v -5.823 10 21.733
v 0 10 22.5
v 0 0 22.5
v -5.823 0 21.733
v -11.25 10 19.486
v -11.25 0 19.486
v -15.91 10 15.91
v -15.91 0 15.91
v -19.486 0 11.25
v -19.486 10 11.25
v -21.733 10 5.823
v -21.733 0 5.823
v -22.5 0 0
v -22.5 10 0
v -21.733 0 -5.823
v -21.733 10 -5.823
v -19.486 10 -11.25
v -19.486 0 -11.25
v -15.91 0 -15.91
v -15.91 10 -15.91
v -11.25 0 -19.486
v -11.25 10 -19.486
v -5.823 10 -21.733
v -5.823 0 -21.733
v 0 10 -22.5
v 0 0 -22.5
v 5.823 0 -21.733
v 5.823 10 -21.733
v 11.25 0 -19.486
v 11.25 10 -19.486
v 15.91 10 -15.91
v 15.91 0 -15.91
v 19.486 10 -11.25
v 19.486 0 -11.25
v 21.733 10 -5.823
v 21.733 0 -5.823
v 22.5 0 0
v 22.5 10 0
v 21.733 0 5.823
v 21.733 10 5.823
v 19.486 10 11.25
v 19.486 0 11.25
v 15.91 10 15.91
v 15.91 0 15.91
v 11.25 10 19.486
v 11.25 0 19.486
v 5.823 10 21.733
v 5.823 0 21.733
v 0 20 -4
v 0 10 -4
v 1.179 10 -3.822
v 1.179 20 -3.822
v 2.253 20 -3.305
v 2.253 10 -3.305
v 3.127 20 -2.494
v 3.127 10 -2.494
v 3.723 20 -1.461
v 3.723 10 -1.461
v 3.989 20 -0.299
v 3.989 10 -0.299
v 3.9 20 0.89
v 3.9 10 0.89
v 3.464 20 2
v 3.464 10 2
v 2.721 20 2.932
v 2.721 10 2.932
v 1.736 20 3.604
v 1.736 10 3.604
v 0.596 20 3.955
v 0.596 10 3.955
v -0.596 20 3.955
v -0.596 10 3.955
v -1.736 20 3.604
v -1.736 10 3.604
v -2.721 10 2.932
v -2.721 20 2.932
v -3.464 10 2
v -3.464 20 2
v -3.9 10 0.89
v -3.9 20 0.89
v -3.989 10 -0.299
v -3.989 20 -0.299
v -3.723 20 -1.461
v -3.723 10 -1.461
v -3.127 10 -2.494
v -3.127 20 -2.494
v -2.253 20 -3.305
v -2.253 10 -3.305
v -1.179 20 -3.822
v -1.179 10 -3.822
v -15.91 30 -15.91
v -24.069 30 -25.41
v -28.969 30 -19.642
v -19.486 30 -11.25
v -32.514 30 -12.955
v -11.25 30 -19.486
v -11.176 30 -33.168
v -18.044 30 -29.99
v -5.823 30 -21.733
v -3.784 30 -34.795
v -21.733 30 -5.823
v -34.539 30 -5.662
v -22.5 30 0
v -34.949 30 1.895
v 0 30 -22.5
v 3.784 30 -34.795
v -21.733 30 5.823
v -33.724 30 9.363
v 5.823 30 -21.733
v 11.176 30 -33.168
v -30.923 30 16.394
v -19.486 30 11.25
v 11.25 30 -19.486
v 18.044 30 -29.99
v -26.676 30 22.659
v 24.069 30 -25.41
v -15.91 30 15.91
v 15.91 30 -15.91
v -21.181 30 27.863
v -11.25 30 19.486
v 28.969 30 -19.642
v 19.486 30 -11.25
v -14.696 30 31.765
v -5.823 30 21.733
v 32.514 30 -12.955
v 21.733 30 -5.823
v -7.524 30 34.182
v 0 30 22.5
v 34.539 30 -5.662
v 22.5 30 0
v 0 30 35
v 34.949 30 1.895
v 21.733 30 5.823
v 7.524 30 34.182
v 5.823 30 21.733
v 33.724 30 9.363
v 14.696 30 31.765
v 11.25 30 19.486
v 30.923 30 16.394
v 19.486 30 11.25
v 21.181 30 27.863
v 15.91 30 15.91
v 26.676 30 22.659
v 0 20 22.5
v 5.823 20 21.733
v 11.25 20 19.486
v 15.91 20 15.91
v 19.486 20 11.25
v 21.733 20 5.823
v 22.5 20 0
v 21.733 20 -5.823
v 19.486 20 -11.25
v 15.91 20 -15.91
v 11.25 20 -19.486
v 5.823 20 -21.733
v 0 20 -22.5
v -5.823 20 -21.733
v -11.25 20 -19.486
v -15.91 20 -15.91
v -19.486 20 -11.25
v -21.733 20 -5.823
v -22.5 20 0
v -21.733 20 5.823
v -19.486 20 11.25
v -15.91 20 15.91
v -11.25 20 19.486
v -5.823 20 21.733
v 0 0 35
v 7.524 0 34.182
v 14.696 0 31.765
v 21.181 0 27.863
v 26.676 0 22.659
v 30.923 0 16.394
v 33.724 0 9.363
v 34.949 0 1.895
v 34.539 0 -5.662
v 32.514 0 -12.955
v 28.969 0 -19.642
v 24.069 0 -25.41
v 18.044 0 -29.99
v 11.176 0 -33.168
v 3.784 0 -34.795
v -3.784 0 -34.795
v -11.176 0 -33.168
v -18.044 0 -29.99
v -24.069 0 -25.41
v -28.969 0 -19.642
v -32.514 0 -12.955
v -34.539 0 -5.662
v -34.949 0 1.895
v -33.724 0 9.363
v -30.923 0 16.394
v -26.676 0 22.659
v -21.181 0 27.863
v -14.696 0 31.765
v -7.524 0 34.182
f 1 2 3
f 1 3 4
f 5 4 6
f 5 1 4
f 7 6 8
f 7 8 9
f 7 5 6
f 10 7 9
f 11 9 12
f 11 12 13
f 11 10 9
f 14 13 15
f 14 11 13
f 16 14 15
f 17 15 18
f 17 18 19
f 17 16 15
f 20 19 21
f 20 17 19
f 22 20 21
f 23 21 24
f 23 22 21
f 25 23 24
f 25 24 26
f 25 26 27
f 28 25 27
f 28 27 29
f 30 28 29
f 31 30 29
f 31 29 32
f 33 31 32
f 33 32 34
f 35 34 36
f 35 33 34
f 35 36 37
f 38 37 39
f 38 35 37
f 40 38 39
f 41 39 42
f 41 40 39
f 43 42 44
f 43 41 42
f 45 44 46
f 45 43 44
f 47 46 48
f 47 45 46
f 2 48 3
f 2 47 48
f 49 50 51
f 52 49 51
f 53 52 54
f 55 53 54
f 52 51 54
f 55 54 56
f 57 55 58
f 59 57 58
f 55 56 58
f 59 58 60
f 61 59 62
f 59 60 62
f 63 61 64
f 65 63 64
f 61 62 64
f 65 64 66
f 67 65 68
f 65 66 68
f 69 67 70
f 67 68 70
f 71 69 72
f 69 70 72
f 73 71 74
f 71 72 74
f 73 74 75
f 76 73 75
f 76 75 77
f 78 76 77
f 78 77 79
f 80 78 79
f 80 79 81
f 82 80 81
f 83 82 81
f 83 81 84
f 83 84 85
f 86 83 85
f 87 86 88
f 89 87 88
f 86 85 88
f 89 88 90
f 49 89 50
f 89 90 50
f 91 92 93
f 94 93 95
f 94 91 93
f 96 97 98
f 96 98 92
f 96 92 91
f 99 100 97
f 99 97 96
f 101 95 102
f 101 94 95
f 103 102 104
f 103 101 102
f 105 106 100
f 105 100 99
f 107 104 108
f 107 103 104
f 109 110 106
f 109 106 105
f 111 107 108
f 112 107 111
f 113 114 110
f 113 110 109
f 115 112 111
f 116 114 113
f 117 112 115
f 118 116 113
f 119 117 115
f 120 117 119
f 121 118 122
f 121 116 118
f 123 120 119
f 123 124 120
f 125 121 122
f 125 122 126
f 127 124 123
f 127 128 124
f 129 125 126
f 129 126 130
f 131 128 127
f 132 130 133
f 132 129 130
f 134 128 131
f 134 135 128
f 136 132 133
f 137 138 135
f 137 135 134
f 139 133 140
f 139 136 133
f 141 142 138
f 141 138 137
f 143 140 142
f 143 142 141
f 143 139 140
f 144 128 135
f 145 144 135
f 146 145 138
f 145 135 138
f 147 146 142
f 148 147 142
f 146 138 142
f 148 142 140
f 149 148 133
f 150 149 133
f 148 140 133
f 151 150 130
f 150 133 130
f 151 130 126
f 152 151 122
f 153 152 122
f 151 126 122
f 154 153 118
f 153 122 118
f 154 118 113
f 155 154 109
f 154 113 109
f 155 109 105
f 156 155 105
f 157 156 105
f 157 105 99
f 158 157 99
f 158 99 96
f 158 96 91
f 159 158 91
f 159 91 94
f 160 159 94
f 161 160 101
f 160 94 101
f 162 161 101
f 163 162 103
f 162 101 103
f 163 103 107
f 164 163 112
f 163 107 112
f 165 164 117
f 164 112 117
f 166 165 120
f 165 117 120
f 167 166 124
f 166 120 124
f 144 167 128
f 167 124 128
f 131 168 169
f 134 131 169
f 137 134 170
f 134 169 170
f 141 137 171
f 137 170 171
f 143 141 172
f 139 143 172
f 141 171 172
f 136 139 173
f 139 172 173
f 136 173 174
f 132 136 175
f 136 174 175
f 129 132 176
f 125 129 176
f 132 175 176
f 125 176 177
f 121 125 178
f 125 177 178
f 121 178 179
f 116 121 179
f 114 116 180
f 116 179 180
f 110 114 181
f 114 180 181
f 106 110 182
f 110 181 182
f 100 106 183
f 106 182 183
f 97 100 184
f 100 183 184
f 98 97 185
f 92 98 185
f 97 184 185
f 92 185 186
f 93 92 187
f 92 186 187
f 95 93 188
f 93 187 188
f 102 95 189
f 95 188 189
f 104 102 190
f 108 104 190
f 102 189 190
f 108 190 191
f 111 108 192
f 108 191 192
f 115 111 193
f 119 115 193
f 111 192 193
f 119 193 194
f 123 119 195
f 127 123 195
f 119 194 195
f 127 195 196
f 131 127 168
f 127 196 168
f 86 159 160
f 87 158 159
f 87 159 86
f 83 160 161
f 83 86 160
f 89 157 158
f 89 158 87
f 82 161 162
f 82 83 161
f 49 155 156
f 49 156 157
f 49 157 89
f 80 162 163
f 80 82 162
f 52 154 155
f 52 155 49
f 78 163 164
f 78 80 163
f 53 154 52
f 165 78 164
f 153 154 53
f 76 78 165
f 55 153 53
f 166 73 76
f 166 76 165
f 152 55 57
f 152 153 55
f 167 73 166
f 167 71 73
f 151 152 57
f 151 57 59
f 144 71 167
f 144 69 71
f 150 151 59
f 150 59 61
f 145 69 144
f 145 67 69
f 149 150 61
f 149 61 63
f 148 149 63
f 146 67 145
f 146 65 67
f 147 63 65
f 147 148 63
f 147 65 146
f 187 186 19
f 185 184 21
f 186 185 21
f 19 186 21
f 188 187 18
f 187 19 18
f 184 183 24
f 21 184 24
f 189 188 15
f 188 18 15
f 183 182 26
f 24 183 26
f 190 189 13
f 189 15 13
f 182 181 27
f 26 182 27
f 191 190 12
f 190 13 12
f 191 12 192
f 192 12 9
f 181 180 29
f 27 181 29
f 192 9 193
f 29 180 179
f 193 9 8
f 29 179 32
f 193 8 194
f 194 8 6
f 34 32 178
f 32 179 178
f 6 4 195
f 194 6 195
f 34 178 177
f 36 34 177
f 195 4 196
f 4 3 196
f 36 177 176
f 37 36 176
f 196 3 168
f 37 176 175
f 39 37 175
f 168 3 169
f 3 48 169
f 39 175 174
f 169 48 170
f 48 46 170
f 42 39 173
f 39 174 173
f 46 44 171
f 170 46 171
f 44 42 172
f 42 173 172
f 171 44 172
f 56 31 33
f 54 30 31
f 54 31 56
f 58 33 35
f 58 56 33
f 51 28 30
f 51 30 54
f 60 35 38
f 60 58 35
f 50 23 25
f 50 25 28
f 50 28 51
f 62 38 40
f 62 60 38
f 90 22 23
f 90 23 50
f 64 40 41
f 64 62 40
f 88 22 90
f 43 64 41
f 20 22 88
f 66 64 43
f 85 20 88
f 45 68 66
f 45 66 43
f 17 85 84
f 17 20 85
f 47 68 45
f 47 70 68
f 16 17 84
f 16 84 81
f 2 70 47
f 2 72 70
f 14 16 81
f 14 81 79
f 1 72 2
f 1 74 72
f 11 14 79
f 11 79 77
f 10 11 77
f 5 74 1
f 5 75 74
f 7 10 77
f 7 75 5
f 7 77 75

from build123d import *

# Parameters (mm, degrees)
SKETCH1_R           = 35
BOSS_EXTRUDE1_DEPTH = 30
SKETCH2_R           = 22.5
CUT_EXTRUDE1_DEPTH  = 10
CUT_EXTRUDE2_START  = -10
SKETCH3_R           = 22.5
CUT_EXTRUDE2_DEPTH  = 10
SKETCH4_R           = 4
CUT_EXTRUDE3_DEPTH  = 10


with BuildPart() as part:
    # Sketch1 → Boss-Extrude1 (new body)
    with BuildSketch(Plane(origin=(0, 0, 0), x_dir=(1, 0, 0), z_dir=(0, 1, 0))):
        with Locations(Location((0, 0, 0), (0, 0, 270))):
            Circle(SKETCH1_R)
    extrude(amount=BOSS_EXTRUDE1_DEPTH)

    # Sketch2 → Cut-Extrude1 (cut)
    with BuildSketch(Plane(origin=(0, 30, 0), x_dir=(1, 0, 0), z_dir=(0, 1, 0))):
        with Locations(Location((0, 0, 0), (0, 0, 270))):
            Circle(SKETCH2_R)
    extrude(amount=-CUT_EXTRUDE1_DEPTH, mode=Mode.SUBTRACT)

    # Sketch3 → Cut-Extrude2 (cut)
    with BuildSketch(Plane.XZ.offset(CUT_EXTRUDE2_START)):
        with Locations(Location((0, 0, 0), (0, 0, 90))):
            Circle(SKETCH3_R)
    extrude(amount=CUT_EXTRUDE2_DEPTH, mode=Mode.SUBTRACT)

    # Sketch4 → Cut-Extrude3 (cut)
    with BuildSketch(Plane.XZ.offset(-10)):
        with Locations(Location((0, 0, 0), (0, 0, 270))):
            Circle(SKETCH4_R)
    extrude(amount=-CUT_EXTRUDE3_DEPTH, mode=Mode.SUBTRACT)


solid = part.part
